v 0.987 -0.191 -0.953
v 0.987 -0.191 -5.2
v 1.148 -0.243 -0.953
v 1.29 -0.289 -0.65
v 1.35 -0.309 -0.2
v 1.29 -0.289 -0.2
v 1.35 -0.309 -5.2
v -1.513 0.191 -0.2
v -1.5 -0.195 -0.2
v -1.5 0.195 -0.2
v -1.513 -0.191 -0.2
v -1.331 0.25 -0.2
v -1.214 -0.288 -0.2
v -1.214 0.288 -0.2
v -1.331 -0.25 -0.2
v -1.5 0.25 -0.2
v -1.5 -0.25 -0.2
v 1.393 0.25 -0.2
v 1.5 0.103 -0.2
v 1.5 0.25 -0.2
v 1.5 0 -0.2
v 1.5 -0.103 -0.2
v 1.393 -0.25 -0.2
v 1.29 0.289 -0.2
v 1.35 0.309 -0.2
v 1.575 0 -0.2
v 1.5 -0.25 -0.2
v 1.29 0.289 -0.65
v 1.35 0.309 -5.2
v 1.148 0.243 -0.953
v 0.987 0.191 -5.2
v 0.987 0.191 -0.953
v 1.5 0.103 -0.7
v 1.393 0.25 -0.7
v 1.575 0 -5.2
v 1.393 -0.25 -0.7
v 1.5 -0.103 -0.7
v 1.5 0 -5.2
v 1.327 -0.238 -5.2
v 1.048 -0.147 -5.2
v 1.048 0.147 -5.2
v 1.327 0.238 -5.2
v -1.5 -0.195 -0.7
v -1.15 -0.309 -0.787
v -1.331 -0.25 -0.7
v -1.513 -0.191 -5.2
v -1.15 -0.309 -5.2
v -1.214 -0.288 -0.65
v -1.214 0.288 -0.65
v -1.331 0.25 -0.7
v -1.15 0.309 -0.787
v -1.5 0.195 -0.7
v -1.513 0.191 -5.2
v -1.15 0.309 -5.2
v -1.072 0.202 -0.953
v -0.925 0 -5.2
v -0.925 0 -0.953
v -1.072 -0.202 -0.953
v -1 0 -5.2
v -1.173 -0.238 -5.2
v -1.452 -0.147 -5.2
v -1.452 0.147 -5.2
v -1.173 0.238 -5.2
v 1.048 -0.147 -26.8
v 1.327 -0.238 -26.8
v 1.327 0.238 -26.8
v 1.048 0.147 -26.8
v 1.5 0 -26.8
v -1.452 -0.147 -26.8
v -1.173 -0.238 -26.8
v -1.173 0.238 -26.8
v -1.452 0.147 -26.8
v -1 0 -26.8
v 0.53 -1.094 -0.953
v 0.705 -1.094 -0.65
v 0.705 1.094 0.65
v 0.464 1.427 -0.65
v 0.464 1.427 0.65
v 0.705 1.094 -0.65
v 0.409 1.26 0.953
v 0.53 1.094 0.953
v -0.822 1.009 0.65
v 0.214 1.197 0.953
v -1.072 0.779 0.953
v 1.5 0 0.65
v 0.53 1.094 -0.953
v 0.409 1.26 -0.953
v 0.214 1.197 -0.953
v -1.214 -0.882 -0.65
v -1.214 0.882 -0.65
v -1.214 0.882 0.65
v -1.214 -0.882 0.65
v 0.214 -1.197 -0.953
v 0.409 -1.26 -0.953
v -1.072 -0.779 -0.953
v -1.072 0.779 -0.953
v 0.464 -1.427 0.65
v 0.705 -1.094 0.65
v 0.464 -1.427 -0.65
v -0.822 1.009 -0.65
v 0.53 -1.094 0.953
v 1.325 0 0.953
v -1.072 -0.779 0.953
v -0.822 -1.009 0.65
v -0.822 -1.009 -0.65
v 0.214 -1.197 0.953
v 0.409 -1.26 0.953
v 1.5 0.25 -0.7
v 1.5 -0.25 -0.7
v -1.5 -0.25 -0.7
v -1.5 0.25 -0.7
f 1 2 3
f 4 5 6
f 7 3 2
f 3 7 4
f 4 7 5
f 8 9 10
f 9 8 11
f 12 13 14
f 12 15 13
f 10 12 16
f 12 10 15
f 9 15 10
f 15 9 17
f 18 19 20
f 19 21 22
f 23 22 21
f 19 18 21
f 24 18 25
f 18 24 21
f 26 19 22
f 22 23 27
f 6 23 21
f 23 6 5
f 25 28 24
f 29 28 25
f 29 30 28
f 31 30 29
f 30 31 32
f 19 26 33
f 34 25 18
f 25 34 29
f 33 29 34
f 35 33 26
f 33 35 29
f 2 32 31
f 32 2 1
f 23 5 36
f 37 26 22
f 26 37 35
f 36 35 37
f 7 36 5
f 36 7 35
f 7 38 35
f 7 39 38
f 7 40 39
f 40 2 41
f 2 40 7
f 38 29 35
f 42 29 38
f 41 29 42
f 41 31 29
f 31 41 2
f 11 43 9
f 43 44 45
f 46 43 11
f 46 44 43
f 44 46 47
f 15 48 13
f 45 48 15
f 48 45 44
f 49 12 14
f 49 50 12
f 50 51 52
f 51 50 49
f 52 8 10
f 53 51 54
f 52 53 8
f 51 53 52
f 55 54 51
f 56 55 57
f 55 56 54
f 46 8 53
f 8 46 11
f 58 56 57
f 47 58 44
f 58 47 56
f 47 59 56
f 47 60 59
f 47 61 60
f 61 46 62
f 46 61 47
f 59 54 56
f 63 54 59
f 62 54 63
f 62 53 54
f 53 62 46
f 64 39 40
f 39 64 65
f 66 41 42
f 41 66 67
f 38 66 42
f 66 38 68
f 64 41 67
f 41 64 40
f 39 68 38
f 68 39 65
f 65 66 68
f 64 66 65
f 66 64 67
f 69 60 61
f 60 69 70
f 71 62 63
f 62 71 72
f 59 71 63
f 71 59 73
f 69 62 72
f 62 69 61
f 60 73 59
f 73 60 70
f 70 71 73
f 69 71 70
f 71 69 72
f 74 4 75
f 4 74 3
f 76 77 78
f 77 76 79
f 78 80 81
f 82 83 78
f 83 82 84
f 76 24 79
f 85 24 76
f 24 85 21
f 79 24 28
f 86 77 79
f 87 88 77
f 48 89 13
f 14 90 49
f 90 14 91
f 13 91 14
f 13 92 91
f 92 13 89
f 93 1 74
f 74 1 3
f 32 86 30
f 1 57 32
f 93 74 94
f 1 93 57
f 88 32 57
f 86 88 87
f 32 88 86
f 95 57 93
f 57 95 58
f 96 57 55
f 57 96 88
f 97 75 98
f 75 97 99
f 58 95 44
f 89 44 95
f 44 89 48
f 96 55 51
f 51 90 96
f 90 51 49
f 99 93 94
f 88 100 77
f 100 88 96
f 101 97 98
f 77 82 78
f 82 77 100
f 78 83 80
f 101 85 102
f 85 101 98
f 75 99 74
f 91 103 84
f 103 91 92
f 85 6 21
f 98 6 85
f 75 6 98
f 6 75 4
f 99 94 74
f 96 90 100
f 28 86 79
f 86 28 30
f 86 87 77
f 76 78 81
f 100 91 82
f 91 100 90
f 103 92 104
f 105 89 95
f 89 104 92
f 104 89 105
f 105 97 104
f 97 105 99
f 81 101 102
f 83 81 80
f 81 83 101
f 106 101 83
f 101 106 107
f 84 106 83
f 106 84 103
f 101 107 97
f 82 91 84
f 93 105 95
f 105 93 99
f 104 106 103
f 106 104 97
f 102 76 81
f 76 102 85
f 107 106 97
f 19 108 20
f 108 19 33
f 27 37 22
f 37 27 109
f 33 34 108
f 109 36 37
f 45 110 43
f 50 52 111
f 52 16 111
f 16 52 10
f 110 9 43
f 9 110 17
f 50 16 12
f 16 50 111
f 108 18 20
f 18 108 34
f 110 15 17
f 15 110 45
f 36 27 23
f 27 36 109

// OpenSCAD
// Parameters
body_d = 3.0; //[1.5:6.0:0.1]
body_t = 2.0; //[1.0:4.0:0.1]
lead_d = 0.5; //[0.25:1.0:0.05]
lead_len = 25.0; //[12.0:50.0:1]
lead_pitch = 2.5; //[1.25:5.0:0.1]
lead_embed = 1.0; //[0.5:2.0:0.1]
bend_len = 5.0; //[2.5:10.0:0.5]
overlap = 0.8; //[0.5:2.0:0.1]
fillet_r = 0.35; //[0.15:0.8:0.05]
tip_chamfer_len = 1.0; //[0.5:2.0:0.1]

// Thermistor Body Core
module thermistor_body_core() {
  translate([0, 0, 0])
    cylinder(r=body_d/2 - fillet_r, h=body_t - 2*fillet_r, center=true);
}

// Body Edge Fillet Sphere
module body_edge_fillet_sphere() {
  translate([0, 0, 0])
    sphere(r=fillet_r, center=true);
}

// Lead 1
module lead_1() {
  translate([lead_pitch/2, 0, -(body_t/2 + (lead_len + lead_embed)/2 - lead_embed + overlap)])
    cylinder(r=lead_d/2, h=lead_len + lead_embed, center=true);
}

// Lead 2
module lead_2() {
  translate([-lead_pitch/2, 0, -(body_t/2 + (lead_len + lead_embed)/2 - lead_embed + overlap)])
    cylinder(r=lead_d/2, h=lead_len + lead_embed, center=true);
}

// Lead Bend Region 1
module lead_bend_region_1() {
  translate([lead_pitch/2, 0, -(body_t/2 + bend_len/2 - overlap)])
    cylinder(r=lead_d/2 + lead_d*0.15, h=bend_len, center=true);
}

// Lead Bend Region 2
module lead_bend_region_2() {
  translate([-lead_pitch/2, 0, -(body_t/2 + bend_len/2 - overlap)])
    cylinder(r=lead_d/2 + lead_d*0.15, h=bend_len, center=true);
}

// Lead Tip Chamfer 1
module lead_tip_chamfer_1() {
  translate([lead_pitch/2, 0, -(body_t/2 + lead_len + tip_chamfer_len/2 - overlap)])
    rotate([180, 0, 0])
    cylinder(r1=lead_d/2, r2=0, h=tip_chamfer_len, center=true);
}

// Lead Tip Chamfer 2
module lead_tip_chamfer_2() {
  translate([-lead_pitch/2, 0, -(body_t/2 + lead_len + tip_chamfer_len/2 - overlap)])
    rotate([180, 0, 0])
    cylinder(r1=lead_d/2, r2=0, h=tip_chamfer_len, center=true);
}

// Lead Spacing Reference
module lead_spacing_reference() {
  translate([0, 0, -(body_t/2 + lead_d/2 - overlap)])
    cube([lead_pitch + lead_d, lead_d, lead_d], center=true);
}

// Marking Text
module marking_text() {
  translate([0, 0, body_t/2 - (body_t*0.15)/2 - overlap])
    cube([body_d*0.6, body_d*0.25, body_t*0.15], center=true);
}

// Thermistor Body with Fillet
module thermistor_body() {
  minkowski() {
    thermistor_body_core();
    body_edge_fillet_sphere();
  }
}

// Lead Bend Region
module lead_bend_region() {
  union() {
    lead_bend_region_1();
    lead_bend_region_2();
  }
}

// Lead Tip Chamfer
module lead_tip_chamfer() {
  union() {
    lead_tip_chamfer_1();
    lead_tip_chamfer_2();
  }
}

// Leads Union
module leads_union() {
  union() {
    lead_1();
    lead_2();
    lead_bend_region();
    lead_tip_chamfer();
  }
}

// Complete Model
module complete_model() {
  union() {
    thermistor_body();
    leads_union();
    lead_spacing_reference();
    marking_text();
  }
}

// Final Output
complete_model();
